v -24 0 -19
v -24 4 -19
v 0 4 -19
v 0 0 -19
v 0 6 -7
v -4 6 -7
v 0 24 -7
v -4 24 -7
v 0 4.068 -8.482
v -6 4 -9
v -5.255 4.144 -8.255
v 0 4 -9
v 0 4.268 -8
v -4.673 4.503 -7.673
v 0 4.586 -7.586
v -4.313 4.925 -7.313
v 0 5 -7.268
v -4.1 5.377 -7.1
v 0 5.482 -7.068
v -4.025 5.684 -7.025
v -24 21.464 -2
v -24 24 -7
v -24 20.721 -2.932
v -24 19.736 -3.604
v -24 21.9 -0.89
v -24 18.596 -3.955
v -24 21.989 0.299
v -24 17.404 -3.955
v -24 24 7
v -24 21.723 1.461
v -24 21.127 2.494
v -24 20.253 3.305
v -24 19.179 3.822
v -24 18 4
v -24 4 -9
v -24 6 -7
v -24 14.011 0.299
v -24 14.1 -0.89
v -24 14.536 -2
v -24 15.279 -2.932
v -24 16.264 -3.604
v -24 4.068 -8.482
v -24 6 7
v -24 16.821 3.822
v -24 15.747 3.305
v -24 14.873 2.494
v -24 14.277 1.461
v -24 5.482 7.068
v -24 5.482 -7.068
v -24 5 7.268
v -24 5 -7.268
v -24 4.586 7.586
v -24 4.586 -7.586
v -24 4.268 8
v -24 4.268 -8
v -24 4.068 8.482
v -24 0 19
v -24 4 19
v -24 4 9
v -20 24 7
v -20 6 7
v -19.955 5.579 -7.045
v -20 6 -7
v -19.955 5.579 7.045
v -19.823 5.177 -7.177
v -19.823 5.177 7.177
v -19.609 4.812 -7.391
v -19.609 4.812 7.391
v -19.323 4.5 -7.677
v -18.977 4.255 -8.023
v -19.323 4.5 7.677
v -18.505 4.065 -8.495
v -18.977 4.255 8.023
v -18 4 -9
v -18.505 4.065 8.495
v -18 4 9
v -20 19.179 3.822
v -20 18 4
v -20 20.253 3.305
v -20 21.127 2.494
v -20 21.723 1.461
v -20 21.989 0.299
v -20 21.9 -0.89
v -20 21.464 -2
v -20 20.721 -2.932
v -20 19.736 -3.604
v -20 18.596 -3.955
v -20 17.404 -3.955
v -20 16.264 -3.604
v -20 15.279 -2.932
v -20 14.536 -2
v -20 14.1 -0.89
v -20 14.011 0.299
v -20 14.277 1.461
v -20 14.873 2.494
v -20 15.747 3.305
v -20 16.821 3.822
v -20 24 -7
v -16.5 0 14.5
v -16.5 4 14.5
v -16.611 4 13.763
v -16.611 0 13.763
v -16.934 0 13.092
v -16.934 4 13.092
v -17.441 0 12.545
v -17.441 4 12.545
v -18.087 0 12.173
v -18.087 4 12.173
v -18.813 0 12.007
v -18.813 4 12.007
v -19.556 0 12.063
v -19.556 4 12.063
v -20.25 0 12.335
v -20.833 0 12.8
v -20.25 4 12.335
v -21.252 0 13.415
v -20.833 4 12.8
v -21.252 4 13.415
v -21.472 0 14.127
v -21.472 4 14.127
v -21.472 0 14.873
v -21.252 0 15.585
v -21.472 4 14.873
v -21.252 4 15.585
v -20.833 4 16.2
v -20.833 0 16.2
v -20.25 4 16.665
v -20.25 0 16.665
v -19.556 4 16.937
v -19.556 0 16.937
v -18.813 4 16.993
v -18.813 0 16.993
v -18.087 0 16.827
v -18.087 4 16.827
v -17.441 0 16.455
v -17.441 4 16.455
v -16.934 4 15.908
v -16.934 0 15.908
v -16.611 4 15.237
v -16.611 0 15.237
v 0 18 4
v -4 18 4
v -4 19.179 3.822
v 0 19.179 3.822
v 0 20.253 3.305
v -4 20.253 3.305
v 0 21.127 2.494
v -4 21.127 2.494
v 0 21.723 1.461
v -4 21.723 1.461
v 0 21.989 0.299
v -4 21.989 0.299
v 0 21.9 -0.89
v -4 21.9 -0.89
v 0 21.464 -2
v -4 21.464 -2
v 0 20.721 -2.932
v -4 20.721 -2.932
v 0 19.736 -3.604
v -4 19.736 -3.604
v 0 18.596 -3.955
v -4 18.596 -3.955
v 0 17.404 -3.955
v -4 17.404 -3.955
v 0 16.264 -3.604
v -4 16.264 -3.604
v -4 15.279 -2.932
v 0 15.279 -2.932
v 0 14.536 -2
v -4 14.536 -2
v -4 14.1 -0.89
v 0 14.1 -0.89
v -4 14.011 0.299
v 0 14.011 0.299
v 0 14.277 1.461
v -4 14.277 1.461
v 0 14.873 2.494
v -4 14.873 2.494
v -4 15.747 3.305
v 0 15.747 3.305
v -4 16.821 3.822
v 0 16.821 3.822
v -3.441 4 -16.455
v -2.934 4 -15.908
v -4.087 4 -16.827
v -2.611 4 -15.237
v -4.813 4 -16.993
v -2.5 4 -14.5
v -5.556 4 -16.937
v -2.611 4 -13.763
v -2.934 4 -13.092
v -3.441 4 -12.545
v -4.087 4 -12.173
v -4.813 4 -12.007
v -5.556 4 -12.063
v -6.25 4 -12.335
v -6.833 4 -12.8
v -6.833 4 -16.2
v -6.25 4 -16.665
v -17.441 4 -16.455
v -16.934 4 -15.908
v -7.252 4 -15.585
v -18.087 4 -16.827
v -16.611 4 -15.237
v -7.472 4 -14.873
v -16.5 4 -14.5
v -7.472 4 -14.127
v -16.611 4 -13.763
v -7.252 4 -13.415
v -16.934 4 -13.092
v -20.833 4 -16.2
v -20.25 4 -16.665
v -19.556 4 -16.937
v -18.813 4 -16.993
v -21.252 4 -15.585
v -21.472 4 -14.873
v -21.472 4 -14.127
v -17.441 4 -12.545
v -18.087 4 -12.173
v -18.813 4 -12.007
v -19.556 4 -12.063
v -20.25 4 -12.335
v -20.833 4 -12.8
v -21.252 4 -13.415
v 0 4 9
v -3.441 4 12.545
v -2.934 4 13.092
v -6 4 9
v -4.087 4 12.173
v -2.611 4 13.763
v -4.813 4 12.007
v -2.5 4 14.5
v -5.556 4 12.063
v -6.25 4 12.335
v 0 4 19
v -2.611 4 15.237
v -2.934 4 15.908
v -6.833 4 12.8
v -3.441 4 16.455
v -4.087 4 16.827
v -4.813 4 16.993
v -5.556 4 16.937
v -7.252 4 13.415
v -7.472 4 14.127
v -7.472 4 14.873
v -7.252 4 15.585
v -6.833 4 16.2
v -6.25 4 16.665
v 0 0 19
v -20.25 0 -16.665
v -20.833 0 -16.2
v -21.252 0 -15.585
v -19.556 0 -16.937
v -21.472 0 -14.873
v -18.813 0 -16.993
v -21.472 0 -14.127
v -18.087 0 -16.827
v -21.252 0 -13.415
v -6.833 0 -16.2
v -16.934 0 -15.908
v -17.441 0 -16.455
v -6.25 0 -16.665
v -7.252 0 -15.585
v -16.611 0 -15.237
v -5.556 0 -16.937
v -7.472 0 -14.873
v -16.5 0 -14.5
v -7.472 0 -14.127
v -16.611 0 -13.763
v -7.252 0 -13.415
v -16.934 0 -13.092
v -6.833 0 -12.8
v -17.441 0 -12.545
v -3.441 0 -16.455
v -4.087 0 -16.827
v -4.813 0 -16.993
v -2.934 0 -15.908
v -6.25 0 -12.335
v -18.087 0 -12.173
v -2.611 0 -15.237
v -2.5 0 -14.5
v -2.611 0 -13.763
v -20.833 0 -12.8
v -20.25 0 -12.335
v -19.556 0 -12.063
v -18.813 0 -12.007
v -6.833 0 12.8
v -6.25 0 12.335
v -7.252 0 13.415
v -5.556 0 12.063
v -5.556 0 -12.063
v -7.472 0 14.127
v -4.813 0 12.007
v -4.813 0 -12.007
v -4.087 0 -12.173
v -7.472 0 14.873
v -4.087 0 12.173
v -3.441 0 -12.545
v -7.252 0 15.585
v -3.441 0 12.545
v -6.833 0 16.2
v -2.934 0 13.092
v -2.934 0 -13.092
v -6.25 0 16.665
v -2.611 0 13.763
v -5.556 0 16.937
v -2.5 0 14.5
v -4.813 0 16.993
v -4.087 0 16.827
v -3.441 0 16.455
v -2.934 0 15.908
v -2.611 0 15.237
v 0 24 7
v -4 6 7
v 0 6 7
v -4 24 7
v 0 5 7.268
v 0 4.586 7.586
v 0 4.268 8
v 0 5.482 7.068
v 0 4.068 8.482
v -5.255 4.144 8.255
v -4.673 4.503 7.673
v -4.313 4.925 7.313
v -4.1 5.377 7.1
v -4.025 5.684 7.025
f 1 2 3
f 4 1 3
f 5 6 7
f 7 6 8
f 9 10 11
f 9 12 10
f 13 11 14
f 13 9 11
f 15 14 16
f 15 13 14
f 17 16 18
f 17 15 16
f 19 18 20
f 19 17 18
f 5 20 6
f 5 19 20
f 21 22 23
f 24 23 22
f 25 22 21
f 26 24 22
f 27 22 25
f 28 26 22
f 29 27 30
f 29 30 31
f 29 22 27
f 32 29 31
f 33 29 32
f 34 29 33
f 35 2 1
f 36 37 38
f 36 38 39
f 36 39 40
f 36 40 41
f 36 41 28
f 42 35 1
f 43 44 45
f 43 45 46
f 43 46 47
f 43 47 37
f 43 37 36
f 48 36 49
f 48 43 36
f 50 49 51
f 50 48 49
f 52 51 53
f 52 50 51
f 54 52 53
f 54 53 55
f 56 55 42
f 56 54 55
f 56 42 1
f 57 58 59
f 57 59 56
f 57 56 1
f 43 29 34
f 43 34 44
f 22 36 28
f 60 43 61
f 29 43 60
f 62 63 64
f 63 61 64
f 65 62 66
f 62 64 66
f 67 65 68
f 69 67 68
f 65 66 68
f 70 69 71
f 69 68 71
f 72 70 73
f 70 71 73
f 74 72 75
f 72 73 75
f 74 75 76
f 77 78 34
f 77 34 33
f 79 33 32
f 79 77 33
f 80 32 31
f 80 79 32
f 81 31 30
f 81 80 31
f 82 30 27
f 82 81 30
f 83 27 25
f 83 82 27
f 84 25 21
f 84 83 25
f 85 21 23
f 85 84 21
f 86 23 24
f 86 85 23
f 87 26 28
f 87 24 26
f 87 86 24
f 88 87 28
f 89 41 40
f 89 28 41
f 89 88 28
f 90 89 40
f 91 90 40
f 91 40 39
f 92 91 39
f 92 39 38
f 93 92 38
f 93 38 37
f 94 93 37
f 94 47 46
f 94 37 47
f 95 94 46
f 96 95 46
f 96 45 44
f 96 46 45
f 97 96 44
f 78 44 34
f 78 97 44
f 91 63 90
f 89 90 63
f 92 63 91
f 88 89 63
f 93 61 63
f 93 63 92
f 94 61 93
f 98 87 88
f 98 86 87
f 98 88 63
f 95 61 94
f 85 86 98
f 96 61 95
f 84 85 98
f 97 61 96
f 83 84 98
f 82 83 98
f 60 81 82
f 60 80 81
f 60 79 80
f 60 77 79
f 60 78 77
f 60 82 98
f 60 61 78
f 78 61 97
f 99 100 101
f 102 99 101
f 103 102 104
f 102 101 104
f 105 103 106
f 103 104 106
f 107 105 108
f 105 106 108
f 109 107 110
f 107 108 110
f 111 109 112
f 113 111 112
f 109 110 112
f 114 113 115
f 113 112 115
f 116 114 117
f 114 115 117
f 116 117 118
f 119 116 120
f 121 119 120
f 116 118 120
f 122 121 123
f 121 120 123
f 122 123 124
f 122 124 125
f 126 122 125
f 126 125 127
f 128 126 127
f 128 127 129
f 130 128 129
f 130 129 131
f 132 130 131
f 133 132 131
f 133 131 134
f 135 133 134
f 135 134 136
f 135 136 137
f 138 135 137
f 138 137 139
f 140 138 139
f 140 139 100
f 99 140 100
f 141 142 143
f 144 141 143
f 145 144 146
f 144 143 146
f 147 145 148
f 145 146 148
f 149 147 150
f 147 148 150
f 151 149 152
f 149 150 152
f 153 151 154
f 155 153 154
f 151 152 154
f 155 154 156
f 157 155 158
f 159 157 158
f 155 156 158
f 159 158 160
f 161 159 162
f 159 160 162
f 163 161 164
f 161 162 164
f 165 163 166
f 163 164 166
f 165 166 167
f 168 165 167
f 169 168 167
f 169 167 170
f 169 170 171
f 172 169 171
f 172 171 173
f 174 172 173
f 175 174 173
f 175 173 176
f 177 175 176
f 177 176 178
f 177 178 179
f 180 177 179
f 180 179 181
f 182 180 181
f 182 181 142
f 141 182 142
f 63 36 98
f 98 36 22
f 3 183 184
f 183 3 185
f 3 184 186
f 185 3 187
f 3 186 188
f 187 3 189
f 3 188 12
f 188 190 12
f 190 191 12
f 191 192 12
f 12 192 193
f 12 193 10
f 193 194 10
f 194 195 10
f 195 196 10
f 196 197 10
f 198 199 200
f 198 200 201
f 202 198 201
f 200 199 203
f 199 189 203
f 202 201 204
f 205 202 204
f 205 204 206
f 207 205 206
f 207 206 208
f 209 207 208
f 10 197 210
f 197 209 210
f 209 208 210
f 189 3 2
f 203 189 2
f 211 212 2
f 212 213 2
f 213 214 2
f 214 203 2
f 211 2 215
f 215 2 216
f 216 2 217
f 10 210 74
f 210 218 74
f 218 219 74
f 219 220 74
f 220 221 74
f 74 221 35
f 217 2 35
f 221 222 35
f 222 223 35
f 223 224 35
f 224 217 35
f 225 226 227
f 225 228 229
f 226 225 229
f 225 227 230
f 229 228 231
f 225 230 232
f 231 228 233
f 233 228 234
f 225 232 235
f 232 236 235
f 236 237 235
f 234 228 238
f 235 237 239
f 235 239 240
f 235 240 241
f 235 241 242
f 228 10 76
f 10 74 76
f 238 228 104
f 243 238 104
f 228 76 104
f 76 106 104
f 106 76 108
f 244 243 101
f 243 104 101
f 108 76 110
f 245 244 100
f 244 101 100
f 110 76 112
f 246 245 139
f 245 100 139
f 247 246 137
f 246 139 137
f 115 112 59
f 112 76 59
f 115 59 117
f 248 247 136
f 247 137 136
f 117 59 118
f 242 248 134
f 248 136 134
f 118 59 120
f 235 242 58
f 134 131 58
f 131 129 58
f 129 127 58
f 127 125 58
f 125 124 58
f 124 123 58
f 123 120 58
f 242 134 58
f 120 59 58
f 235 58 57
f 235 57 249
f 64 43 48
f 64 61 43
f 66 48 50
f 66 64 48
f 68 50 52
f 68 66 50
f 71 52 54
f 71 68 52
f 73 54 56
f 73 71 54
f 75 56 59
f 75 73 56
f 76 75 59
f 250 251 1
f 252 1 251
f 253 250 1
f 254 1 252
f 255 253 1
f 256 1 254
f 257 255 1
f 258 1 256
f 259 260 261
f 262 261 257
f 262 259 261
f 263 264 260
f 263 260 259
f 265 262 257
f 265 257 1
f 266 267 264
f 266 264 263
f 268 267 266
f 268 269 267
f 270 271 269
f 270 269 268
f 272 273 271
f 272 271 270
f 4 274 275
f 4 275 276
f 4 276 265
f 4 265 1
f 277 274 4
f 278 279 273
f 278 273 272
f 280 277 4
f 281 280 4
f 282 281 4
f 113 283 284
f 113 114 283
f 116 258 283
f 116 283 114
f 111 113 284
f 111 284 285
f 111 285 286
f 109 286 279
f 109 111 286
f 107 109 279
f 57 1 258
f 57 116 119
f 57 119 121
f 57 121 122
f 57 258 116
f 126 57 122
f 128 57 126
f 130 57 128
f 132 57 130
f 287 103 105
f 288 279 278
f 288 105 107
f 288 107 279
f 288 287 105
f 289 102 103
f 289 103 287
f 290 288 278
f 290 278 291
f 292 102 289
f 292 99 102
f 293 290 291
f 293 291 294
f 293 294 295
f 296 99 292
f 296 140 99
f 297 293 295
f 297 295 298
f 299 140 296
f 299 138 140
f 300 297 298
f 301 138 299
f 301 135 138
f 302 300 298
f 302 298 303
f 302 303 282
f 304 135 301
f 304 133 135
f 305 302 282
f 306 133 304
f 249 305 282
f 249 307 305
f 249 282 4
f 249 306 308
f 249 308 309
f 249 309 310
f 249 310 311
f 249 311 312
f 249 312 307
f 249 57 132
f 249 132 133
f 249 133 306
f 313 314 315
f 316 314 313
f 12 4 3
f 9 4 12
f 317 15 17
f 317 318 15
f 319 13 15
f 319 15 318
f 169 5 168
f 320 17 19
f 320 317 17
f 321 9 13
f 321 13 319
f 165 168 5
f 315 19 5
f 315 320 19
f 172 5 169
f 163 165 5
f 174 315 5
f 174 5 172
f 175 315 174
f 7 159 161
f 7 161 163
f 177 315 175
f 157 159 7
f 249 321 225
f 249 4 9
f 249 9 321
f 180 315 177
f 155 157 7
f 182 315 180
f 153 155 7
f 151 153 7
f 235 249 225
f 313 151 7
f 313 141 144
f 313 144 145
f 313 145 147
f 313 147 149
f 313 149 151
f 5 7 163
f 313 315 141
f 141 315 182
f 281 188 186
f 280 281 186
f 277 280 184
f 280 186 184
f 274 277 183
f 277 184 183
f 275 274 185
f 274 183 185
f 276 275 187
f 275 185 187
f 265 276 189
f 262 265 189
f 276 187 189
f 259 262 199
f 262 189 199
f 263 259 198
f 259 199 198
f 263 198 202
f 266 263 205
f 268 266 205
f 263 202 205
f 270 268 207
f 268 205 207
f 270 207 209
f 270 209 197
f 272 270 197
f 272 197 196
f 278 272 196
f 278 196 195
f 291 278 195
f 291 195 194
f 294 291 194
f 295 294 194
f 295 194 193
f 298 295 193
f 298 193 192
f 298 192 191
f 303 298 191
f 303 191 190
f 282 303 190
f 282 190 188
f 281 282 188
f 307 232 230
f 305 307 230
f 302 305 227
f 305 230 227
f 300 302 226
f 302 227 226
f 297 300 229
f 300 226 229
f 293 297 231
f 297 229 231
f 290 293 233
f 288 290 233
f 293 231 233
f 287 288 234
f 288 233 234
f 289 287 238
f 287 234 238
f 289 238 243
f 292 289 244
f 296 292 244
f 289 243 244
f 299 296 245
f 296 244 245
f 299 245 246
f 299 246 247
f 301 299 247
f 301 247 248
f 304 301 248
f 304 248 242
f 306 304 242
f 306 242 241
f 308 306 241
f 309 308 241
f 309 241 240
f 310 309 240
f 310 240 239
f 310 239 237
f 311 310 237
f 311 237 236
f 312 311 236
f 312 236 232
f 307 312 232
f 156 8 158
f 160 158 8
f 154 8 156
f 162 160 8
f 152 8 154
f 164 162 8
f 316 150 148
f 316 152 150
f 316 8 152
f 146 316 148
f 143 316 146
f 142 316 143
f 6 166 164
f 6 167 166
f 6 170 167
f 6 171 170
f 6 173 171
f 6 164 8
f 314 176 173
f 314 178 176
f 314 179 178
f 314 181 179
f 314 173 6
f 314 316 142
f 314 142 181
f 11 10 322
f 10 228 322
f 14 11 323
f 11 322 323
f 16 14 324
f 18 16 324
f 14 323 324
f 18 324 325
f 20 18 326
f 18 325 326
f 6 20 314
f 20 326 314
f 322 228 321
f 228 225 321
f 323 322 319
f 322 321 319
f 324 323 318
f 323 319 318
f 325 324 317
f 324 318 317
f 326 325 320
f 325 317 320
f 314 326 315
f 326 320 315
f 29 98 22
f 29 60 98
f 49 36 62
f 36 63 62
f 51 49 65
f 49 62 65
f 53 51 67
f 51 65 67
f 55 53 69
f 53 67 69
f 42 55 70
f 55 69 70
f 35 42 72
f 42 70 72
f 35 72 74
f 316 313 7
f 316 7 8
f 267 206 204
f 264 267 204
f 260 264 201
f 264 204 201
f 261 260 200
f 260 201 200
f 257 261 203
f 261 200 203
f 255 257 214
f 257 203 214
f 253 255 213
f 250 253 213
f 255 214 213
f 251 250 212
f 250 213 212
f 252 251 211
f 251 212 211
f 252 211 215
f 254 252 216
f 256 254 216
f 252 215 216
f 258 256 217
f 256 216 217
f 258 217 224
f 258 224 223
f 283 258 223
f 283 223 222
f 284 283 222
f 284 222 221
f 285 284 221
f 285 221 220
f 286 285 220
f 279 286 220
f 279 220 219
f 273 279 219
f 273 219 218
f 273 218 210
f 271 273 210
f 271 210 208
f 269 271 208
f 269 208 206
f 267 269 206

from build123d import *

# Parameters (mm, degrees)
BOSS_EXTRUDE1_DEPTH   = 19
SKETCH2_R             = 4
M8_HOLE_DEPTH         = 21
M8_HOLE_DEPTH_BACK    = 5
SKETCH3_R             = 2.5
M5_HOLES_DEPTH        = 21
M5_HOLES_DEPTH_BACK   = 5
SKETCH4_W             = 12
SKETCH4_H             = 20
TRIM_DOWN_SIDES_DEPTH = 25
FILLET3_R             = 2


with BuildPart() as part:
    # Sketch1 → Boss-Extrude1 (new body, symmetric)
    with BuildSketch(Plane.XY):
        Polygon((0, 24), (-4, 24), (-4, 4), (-20, 4), (-20, 24), (-24, 24), (-24, 0), (0, 0), align=None)
    extrude(amount=BOSS_EXTRUDE1_DEPTH, both=True)

    # Sketch2 → M8 hole (cut, two sides)
    with BuildSketch(Plane.ZY.offset(4)) as m8_hole_sk:
        with Locations((0, 18)):
            Circle(SKETCH2_R)
    extrude(amount=M8_HOLE_DEPTH, mode=Mode.SUBTRACT)
    extrude(m8_hole_sk.sketch, amount=-M8_HOLE_DEPTH_BACK, mode=Mode.SUBTRACT)

    # Sketch3 → M5 holes (cut, two sides)
    with BuildSketch(Plane(origin=(0, 4, 0), x_dir=(1, 0, 0), z_dir=(0, 1, 0))) as m5_holes_sk:
        with Locations((-19, 14.5)):
            Circle(SKETCH3_R)
        with Locations((-5, 14.5)):
            Circle(SKETCH3_R)
        with Locations((-5, -14.5)):
            Circle(SKETCH3_R)
        with Locations((-19, -14.5)):
            Circle(SKETCH3_R)
    extrude(amount=M5_HOLES_DEPTH, mode=Mode.SUBTRACT)
    extrude(m5_holes_sk.sketch, amount=-M5_HOLES_DEPTH_BACK, mode=Mode.SUBTRACT)

    # Sketch4 → trim down sides (cut, through all)
    with BuildSketch(Plane.ZY.offset(24)):
        with Locations((-13, 14)):
            Rectangle(SKETCH4_W, SKETCH4_H)
        with Locations((13, 14)):
            Rectangle(SKETCH4_W, SKETCH4_H)
    extrude(amount=-TRIM_DOWN_SIDES_DEPTH, mode=Mode.SUBTRACT)

    # Fillet3
    fillet3_edges = [part.edges().sort_by_distance(p)[0] for p in [
        (-2, 4, 7),
        (-22, 4, 7),
        (-20, 4, 0),
        (-4, 4, 0),
        (-22, 4, -7),
        (-2, 4, -7),
    ]]
    fillet(fillet3_edges, radius=FILLET3_R)


solid = part.part
